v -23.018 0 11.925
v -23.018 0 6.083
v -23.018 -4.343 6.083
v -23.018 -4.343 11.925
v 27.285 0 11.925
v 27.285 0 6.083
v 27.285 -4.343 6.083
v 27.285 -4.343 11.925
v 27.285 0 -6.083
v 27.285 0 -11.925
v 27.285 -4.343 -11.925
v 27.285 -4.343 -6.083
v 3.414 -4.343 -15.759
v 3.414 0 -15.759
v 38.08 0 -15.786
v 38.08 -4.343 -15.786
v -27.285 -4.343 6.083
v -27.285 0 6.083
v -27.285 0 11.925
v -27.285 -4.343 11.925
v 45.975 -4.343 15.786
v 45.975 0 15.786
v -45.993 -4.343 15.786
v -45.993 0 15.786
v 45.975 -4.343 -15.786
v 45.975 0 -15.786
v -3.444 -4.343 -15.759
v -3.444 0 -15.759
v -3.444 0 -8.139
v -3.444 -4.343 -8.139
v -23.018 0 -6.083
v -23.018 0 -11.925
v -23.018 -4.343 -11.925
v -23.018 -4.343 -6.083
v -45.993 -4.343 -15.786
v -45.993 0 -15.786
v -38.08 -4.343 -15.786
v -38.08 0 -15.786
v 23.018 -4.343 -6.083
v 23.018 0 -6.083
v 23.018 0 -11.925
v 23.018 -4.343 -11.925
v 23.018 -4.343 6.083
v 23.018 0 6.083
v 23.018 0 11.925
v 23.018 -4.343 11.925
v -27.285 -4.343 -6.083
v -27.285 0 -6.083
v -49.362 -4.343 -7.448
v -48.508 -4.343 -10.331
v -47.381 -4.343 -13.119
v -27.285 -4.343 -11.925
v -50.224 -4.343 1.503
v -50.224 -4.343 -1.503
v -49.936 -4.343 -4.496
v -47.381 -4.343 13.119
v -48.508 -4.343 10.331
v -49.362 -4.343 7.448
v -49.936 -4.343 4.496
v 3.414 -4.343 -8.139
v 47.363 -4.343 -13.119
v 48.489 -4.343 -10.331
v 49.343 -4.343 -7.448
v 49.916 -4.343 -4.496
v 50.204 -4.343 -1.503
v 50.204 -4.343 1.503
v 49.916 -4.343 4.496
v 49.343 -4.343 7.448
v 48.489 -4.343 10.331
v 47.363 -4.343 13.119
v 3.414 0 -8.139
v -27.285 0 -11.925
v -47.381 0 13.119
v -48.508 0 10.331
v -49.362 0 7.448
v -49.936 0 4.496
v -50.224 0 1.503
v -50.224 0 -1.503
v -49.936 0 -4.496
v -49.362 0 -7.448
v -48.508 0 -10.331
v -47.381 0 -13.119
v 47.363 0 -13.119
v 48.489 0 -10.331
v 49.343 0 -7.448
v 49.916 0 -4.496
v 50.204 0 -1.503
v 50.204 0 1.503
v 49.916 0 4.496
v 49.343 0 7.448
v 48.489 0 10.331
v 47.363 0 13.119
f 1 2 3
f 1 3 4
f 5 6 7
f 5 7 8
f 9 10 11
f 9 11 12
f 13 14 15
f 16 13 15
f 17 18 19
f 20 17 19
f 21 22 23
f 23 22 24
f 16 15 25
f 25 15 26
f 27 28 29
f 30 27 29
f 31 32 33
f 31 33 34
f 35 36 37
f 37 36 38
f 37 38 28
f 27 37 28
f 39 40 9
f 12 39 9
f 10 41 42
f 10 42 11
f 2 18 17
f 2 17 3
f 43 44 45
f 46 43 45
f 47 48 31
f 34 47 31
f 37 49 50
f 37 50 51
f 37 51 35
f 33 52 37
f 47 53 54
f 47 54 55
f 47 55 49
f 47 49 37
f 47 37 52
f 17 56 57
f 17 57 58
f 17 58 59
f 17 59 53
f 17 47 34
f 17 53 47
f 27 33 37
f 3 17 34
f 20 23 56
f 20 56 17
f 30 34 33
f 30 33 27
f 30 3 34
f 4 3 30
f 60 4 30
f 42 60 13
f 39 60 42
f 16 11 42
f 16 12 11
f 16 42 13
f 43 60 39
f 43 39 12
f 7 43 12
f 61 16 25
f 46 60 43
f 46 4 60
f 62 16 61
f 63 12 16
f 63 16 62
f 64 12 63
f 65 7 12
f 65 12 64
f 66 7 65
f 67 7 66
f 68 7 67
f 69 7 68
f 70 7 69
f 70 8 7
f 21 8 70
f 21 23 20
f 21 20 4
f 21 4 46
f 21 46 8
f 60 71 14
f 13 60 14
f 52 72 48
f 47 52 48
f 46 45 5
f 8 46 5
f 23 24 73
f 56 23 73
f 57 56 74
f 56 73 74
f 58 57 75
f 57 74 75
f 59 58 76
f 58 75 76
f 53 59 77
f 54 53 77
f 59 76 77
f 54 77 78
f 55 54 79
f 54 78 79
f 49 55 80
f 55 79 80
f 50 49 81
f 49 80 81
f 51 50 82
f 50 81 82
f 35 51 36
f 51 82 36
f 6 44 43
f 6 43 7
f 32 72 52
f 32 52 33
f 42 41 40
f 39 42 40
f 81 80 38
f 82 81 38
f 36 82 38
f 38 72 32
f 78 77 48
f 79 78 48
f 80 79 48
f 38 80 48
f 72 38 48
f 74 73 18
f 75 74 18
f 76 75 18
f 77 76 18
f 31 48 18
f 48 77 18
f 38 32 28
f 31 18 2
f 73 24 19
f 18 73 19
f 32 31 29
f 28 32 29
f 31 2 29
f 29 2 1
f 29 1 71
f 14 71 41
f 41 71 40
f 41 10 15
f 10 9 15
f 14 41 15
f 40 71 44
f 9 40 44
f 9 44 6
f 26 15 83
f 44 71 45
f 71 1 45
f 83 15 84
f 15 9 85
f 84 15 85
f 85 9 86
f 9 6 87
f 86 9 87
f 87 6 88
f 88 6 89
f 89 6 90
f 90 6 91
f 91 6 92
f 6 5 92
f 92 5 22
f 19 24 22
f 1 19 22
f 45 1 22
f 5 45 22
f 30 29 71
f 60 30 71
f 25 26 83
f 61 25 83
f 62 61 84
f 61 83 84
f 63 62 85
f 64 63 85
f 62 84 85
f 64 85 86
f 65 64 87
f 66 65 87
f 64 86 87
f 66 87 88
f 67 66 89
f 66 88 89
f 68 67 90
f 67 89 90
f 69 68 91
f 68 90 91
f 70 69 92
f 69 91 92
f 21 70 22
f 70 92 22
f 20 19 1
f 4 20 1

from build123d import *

# Parameters (mm, degrees)
F0_W     = 4.2672
F0_H     = 5.842
F0_W_2   = 7.894506
F0_H_2   = 31.5722
F0_W_3   = 7.912528
F1_DEPTH = 4.3434


with BuildPart() as f1:
    # F0 (on Front) → F1 (new body)
    with BuildSketch(Plane.XZ):
        Polygon((38.080222, -15.7861), (38.080222, 15.7861), (-38.080222, 15.7861), (-38.080222, -15.7861), (-3.443861, -15.758646), (-3.443861, -8.138646), (3.414139, -8.138646), (3.414139, -15.758646), align=None)
        with Locations((-25.151622, -9.0043)):
            Rectangle(F0_W, F0_H, mode=Mode.SUBTRACT)
        with Locations((25.151622, -9.0043)):
            Rectangle(F0_W, F0_H, mode=Mode.SUBTRACT)
        with Locations((-25.151622, 9.0043)):
            Rectangle(F0_W, F0_H, mode=Mode.SUBTRACT)
        with Locations((25.151622, 9.0043)):
            Rectangle(F0_W, F0_H, mode=Mode.SUBTRACT)
        with Locations((42.027475, 0)):
            Rectangle(F0_W_2, F0_H_2)
        with Locations((-42.036486, 0)):
            Rectangle(F0_W_3, F0_H_2)
        with BuildLine():
            ThreePointArc((45.974728, -15.7861), (50.240287, 0), (45.974728, 15.7861))
            Line((45.974728, 15.7861), (45.974728, -15.7861))
        make_face()
        with BuildLine():
            Line((-45.99275, -15.7861), (-45.99275, 15.7861))
            ThreePointArc((-45.99275, 15.7861), (-50.259919, 0), (-45.99275, -15.7861))
        make_face()
    extrude(amount=F1_DEPTH)


solid = f1.part
